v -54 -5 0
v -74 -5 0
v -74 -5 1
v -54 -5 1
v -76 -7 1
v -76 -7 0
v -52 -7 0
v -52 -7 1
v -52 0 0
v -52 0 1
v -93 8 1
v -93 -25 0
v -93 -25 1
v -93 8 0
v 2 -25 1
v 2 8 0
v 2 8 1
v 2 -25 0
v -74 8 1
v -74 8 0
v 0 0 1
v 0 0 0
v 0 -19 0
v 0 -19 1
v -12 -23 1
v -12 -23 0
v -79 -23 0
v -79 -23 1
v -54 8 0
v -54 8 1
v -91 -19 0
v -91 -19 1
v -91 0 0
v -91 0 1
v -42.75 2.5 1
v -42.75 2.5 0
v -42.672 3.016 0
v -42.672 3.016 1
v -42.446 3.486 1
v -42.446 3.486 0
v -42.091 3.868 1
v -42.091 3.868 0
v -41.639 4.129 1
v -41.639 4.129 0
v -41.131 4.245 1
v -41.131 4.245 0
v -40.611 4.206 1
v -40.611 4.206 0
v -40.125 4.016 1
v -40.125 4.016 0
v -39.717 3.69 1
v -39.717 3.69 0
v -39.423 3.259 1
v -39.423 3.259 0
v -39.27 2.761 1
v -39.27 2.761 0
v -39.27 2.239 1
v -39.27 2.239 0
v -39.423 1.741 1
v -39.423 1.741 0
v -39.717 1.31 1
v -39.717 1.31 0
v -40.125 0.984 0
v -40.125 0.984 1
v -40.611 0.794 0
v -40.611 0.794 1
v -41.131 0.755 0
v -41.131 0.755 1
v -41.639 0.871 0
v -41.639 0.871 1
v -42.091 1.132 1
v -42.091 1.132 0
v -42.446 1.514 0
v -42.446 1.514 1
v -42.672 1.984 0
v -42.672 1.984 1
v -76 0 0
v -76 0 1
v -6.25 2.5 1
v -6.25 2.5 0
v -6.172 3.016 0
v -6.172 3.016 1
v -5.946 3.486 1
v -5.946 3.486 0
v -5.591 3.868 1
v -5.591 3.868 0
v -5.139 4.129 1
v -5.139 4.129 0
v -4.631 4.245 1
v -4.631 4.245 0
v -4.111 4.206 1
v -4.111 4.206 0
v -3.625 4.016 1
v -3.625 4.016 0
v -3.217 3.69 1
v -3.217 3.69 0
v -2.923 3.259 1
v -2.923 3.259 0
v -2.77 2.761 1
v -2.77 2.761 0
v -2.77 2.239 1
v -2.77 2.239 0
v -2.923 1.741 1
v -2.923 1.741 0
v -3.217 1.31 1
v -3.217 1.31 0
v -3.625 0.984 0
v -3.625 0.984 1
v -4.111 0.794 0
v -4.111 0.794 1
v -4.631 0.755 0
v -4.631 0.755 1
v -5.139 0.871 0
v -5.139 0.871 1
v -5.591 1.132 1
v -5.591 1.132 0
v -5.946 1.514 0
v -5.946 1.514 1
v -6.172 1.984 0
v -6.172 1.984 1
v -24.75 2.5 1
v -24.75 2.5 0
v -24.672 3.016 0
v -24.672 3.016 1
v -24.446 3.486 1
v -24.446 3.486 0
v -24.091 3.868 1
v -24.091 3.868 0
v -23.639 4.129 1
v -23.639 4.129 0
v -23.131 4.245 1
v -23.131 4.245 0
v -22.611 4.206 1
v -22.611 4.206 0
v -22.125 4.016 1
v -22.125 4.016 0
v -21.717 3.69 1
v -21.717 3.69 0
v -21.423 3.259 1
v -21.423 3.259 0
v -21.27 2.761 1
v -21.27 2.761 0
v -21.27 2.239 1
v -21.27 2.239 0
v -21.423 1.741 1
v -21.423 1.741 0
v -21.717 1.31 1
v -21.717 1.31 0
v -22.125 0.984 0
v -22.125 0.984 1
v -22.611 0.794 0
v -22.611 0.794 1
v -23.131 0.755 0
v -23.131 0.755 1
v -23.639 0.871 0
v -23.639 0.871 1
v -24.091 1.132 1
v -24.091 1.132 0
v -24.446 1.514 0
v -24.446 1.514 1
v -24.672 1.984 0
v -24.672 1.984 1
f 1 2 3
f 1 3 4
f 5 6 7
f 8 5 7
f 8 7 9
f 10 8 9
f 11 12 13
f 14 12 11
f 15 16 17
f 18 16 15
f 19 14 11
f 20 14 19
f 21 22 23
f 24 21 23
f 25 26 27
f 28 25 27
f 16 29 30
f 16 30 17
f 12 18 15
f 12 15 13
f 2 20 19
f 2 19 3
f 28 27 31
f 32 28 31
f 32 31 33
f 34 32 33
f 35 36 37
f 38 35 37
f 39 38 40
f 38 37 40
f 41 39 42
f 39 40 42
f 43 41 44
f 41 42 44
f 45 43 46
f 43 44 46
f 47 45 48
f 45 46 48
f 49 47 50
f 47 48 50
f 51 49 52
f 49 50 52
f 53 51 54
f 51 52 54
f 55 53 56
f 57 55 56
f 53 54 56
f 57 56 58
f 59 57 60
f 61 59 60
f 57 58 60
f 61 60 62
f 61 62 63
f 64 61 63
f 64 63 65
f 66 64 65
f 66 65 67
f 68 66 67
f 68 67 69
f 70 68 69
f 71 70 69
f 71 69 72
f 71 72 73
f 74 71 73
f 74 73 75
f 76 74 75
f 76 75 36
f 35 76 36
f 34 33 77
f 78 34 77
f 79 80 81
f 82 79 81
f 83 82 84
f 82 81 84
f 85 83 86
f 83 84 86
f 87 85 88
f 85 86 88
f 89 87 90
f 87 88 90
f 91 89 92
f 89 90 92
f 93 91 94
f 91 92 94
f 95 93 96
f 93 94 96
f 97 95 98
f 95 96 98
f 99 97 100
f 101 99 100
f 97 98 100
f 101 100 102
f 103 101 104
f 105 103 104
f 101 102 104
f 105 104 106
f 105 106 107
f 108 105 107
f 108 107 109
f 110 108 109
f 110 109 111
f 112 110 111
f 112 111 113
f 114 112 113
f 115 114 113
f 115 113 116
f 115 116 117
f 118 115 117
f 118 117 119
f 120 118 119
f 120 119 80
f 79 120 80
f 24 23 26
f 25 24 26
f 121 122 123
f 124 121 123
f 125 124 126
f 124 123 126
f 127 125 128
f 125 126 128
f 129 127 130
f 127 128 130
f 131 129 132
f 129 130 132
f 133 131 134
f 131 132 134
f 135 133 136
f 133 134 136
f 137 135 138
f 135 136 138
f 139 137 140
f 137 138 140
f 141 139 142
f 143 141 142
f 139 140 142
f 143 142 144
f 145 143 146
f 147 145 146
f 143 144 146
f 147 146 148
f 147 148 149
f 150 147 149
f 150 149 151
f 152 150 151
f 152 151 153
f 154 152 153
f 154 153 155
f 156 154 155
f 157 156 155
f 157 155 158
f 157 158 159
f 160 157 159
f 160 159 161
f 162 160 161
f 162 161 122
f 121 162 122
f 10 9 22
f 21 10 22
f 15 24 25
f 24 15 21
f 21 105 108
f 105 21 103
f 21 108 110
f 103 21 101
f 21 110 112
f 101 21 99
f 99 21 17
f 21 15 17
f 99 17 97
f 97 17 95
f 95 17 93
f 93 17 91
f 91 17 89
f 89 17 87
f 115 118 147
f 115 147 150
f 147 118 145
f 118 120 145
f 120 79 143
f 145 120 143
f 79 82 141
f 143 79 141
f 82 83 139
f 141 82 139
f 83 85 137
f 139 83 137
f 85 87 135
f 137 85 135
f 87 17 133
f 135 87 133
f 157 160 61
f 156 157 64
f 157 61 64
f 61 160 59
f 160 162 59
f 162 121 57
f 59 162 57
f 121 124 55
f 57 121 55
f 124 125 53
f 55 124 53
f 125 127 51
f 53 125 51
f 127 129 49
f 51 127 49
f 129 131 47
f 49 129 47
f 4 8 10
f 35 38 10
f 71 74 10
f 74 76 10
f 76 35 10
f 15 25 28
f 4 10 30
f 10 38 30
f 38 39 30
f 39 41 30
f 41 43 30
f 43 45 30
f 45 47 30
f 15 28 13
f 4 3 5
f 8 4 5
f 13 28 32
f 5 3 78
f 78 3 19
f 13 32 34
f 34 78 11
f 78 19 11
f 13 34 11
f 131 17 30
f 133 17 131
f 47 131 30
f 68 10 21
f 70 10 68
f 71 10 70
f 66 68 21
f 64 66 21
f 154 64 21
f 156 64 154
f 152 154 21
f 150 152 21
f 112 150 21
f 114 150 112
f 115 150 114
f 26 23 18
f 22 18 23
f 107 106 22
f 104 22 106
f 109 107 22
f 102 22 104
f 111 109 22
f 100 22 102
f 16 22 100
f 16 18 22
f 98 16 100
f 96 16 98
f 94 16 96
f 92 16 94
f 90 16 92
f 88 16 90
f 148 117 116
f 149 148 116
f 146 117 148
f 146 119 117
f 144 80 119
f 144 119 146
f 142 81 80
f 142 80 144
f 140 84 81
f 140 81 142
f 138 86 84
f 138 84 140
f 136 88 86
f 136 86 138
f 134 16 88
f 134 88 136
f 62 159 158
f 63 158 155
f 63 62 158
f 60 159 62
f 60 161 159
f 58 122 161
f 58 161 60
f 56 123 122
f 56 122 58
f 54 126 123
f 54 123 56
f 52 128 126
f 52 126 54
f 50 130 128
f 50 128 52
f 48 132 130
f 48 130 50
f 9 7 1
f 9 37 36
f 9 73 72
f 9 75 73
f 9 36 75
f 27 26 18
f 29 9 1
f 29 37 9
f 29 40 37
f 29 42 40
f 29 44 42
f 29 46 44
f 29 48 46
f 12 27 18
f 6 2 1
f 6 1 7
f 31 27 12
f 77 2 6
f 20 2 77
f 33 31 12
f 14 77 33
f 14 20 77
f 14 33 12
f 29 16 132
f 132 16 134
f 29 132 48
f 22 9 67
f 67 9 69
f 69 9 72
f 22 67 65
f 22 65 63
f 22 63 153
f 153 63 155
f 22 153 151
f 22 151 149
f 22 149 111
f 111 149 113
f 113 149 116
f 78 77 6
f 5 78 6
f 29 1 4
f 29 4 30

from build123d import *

# Parameters (mm, degrees)
BOSS_EXTRUDE2_DEPTH   = 1
CUT_EXTRUDE2_DEPTH    = 1
F_3_0MM_DOWEL_HOLE1_D = 3.5


with BuildPart() as part:
    # Sketch2 → Boss-Extrude2 (new body)
    with BuildSketch(Plane.XY):
        Polygon((2, 8), (2, -25), (-93, -25), (-93, 8), (-74, 8), (-74, -5), (-54, -5), (-54, 8), align=None)
    extrude(amount=BOSS_EXTRUDE2_DEPTH)

    # Sketch1 → Cut-Extrude2 (cut)
    with BuildSketch(Plane.XY):
        Polygon((0, 0), (0, -19), (-12, -23), (-79, -23), (-91, -19), (-91, 0), (-76, 0), (-76, -7), (-52, -7), (-52, 0), align=None)
    extrude(amount=CUT_EXTRUDE2_DEPTH, mode=Mode.SUBTRACT)

    # Ø3.0mm Dowel Hole1 (through all)
    with Locations(Plane.XY.offset(1)):
        with Locations((-41, 2.5), (-23, 2.5), (-4.5, 2.5)):
            Hole(F_3_0MM_DOWEL_HOLE1_D / 2)


solid = part.part
